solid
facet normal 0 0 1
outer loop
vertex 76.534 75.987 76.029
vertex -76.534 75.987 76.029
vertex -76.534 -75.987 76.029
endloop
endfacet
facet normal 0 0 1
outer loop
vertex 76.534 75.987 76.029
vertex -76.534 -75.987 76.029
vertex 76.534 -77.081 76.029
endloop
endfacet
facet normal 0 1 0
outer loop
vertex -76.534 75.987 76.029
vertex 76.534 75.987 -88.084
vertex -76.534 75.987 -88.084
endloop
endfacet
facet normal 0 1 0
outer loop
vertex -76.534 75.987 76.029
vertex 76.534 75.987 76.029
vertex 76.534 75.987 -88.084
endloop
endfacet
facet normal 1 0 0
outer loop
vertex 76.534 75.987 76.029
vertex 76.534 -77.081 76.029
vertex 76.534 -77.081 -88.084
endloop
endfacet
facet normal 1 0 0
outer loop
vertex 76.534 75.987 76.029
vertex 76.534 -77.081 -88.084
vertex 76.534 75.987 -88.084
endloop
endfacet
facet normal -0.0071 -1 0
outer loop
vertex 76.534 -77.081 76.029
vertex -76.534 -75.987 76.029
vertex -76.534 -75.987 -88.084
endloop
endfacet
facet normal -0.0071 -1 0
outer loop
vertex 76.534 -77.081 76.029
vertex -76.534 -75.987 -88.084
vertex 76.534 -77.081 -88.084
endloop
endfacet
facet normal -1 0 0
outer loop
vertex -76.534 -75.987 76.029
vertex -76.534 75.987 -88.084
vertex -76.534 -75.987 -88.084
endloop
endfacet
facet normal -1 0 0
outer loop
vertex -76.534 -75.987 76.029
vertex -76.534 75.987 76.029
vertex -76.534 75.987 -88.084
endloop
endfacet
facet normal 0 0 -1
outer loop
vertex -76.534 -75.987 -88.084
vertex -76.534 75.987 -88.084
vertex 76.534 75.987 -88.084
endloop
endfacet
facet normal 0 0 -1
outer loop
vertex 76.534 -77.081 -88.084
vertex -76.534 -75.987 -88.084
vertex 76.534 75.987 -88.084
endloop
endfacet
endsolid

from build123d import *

# Parameters (mm, degrees)
F1_DEPTH = 25.4
F2_DEPTH = 50.6288483739
F3_DEPTH = 88.0838930607


with BuildPart() as f1:
    # F0 (on Top) → F1 (new body)
    with BuildSketch(Plane.XY):
        Polygon((-76.5340924263, 75.9874135256), (-76.5340924263, -75.9874135256), (76.5340924263, -77.080771327), (76.5340924263, 75.9874135256), align=None)
    extrude(amount=F1_DEPTH)

    # F2 (add): a face of the model
    f2_faces = [f1.faces().sort_by_distance(p)[0] for p in [
        (0.0914397246, -0.2736660249, 25.4),
    ]]
    extrude(f2_faces, amount=F2_DEPTH)

    # F3 (add): a face of the model
    f3_faces = [f1.faces().sort_by_distance(p)[0] for p in [
        (0.0914397246, -0.2736660249, 0),
    ]]
    extrude(f3_faces, amount=F3_DEPTH)


solid = f1.part
